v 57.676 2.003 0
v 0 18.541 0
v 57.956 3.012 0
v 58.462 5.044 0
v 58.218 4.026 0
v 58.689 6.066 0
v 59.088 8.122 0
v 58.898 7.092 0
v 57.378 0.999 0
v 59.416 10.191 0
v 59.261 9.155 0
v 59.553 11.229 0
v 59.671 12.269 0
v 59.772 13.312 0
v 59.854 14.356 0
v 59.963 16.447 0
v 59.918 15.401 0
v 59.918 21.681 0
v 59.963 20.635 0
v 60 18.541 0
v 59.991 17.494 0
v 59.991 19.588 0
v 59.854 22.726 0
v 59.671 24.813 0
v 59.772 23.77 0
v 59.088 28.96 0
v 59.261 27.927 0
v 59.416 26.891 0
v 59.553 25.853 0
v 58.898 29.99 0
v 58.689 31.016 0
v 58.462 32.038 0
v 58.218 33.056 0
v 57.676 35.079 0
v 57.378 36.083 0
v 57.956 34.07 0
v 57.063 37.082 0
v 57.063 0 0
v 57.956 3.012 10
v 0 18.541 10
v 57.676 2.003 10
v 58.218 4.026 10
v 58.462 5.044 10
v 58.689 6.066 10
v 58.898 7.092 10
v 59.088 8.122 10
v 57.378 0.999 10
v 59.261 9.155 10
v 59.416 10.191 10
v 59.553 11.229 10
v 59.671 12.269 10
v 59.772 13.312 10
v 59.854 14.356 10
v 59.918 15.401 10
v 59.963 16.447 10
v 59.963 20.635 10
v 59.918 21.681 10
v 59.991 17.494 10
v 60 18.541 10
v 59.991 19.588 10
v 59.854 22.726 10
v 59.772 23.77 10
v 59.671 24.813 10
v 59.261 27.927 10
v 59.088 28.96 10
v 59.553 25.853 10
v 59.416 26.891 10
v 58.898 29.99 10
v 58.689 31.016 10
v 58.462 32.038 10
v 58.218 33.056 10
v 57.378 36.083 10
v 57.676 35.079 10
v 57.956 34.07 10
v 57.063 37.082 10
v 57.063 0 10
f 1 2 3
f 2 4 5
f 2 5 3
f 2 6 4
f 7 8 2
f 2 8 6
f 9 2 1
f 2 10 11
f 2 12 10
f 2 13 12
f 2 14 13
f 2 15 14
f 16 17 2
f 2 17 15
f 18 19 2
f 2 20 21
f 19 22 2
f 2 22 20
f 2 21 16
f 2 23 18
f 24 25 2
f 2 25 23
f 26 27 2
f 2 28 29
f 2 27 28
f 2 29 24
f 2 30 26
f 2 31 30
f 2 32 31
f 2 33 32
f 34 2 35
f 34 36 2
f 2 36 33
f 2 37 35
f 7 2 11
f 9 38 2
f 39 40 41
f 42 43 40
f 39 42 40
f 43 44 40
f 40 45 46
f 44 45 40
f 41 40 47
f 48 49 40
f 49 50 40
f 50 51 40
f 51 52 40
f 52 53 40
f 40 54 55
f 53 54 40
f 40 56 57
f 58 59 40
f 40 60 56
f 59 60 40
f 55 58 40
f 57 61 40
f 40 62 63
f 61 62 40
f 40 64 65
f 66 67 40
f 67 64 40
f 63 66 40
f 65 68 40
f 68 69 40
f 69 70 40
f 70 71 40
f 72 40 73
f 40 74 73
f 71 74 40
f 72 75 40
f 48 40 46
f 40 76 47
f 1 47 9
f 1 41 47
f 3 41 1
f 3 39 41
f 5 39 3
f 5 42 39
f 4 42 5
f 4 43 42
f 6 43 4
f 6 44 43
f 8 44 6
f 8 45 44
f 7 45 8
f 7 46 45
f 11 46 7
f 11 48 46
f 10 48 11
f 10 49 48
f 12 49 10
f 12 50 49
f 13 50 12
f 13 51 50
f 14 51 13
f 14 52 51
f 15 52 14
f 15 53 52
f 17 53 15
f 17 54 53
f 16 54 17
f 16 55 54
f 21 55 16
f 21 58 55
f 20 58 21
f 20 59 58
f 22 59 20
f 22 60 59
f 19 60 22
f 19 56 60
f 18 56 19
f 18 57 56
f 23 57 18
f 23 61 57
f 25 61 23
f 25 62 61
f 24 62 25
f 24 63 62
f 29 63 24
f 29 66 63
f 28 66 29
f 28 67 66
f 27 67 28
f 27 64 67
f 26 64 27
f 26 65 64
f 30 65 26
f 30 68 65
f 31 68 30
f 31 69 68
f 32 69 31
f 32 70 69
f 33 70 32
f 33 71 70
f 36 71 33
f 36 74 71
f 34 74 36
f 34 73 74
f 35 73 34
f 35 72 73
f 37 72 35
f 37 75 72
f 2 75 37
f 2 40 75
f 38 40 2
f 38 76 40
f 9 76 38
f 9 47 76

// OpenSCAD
$fn = 32;

// ----------------------------------------------------------------------
// Arc profile plate: sector, 38 points
// ----------------------------------------------------------------------

// --- parameters (mm) ---
sector_angle = 36;        // sector angle, degrees
sector_r = 60;            // outer radius
arc_step = 1;             // sampling step of the arc, degrees
plate_t = 10;             // plate thickness, Z

bbox_x = 2 * sector_r * sin(sector_angle / 2);  // chord of the sector
bbox_y = sector_r;  // depth of the sector (apex to arc)

profile = [[57.063, 0], [57.378, 0.999], [57.676, 2.003], [57.956, 3.012], [58.218, 4.026], [58.462, 5.044], [58.689, 6.066], [58.898, 7.092], [59.088, 8.122], [59.261, 9.155], [59.416, 10.191], [59.553, 11.229], [59.671, 12.269], [59.772, 13.312], [59.854, 14.356], [59.918, 15.401], [59.963, 16.447], [59.991, 17.494], [60, 18.541], [59.991, 19.588], [59.963, 20.635], [59.918, 21.681], [59.854, 22.726], [59.772, 23.77], [59.671, 24.813], [59.553, 25.853], [59.416, 26.891], [59.261, 27.927], [59.088, 28.96], [58.898, 29.99], [58.689, 31.016], [58.462, 32.038], [58.218, 33.056], [57.956, 34.07], [57.676, 35.079], [57.378, 36.083], [57.063, 37.082], [0, 18.541]];  // primary outline, 38 points, counter clockwise

// --- the one profile operation ---
linear_extrude(height = plate_t) polygon(points = profile);
